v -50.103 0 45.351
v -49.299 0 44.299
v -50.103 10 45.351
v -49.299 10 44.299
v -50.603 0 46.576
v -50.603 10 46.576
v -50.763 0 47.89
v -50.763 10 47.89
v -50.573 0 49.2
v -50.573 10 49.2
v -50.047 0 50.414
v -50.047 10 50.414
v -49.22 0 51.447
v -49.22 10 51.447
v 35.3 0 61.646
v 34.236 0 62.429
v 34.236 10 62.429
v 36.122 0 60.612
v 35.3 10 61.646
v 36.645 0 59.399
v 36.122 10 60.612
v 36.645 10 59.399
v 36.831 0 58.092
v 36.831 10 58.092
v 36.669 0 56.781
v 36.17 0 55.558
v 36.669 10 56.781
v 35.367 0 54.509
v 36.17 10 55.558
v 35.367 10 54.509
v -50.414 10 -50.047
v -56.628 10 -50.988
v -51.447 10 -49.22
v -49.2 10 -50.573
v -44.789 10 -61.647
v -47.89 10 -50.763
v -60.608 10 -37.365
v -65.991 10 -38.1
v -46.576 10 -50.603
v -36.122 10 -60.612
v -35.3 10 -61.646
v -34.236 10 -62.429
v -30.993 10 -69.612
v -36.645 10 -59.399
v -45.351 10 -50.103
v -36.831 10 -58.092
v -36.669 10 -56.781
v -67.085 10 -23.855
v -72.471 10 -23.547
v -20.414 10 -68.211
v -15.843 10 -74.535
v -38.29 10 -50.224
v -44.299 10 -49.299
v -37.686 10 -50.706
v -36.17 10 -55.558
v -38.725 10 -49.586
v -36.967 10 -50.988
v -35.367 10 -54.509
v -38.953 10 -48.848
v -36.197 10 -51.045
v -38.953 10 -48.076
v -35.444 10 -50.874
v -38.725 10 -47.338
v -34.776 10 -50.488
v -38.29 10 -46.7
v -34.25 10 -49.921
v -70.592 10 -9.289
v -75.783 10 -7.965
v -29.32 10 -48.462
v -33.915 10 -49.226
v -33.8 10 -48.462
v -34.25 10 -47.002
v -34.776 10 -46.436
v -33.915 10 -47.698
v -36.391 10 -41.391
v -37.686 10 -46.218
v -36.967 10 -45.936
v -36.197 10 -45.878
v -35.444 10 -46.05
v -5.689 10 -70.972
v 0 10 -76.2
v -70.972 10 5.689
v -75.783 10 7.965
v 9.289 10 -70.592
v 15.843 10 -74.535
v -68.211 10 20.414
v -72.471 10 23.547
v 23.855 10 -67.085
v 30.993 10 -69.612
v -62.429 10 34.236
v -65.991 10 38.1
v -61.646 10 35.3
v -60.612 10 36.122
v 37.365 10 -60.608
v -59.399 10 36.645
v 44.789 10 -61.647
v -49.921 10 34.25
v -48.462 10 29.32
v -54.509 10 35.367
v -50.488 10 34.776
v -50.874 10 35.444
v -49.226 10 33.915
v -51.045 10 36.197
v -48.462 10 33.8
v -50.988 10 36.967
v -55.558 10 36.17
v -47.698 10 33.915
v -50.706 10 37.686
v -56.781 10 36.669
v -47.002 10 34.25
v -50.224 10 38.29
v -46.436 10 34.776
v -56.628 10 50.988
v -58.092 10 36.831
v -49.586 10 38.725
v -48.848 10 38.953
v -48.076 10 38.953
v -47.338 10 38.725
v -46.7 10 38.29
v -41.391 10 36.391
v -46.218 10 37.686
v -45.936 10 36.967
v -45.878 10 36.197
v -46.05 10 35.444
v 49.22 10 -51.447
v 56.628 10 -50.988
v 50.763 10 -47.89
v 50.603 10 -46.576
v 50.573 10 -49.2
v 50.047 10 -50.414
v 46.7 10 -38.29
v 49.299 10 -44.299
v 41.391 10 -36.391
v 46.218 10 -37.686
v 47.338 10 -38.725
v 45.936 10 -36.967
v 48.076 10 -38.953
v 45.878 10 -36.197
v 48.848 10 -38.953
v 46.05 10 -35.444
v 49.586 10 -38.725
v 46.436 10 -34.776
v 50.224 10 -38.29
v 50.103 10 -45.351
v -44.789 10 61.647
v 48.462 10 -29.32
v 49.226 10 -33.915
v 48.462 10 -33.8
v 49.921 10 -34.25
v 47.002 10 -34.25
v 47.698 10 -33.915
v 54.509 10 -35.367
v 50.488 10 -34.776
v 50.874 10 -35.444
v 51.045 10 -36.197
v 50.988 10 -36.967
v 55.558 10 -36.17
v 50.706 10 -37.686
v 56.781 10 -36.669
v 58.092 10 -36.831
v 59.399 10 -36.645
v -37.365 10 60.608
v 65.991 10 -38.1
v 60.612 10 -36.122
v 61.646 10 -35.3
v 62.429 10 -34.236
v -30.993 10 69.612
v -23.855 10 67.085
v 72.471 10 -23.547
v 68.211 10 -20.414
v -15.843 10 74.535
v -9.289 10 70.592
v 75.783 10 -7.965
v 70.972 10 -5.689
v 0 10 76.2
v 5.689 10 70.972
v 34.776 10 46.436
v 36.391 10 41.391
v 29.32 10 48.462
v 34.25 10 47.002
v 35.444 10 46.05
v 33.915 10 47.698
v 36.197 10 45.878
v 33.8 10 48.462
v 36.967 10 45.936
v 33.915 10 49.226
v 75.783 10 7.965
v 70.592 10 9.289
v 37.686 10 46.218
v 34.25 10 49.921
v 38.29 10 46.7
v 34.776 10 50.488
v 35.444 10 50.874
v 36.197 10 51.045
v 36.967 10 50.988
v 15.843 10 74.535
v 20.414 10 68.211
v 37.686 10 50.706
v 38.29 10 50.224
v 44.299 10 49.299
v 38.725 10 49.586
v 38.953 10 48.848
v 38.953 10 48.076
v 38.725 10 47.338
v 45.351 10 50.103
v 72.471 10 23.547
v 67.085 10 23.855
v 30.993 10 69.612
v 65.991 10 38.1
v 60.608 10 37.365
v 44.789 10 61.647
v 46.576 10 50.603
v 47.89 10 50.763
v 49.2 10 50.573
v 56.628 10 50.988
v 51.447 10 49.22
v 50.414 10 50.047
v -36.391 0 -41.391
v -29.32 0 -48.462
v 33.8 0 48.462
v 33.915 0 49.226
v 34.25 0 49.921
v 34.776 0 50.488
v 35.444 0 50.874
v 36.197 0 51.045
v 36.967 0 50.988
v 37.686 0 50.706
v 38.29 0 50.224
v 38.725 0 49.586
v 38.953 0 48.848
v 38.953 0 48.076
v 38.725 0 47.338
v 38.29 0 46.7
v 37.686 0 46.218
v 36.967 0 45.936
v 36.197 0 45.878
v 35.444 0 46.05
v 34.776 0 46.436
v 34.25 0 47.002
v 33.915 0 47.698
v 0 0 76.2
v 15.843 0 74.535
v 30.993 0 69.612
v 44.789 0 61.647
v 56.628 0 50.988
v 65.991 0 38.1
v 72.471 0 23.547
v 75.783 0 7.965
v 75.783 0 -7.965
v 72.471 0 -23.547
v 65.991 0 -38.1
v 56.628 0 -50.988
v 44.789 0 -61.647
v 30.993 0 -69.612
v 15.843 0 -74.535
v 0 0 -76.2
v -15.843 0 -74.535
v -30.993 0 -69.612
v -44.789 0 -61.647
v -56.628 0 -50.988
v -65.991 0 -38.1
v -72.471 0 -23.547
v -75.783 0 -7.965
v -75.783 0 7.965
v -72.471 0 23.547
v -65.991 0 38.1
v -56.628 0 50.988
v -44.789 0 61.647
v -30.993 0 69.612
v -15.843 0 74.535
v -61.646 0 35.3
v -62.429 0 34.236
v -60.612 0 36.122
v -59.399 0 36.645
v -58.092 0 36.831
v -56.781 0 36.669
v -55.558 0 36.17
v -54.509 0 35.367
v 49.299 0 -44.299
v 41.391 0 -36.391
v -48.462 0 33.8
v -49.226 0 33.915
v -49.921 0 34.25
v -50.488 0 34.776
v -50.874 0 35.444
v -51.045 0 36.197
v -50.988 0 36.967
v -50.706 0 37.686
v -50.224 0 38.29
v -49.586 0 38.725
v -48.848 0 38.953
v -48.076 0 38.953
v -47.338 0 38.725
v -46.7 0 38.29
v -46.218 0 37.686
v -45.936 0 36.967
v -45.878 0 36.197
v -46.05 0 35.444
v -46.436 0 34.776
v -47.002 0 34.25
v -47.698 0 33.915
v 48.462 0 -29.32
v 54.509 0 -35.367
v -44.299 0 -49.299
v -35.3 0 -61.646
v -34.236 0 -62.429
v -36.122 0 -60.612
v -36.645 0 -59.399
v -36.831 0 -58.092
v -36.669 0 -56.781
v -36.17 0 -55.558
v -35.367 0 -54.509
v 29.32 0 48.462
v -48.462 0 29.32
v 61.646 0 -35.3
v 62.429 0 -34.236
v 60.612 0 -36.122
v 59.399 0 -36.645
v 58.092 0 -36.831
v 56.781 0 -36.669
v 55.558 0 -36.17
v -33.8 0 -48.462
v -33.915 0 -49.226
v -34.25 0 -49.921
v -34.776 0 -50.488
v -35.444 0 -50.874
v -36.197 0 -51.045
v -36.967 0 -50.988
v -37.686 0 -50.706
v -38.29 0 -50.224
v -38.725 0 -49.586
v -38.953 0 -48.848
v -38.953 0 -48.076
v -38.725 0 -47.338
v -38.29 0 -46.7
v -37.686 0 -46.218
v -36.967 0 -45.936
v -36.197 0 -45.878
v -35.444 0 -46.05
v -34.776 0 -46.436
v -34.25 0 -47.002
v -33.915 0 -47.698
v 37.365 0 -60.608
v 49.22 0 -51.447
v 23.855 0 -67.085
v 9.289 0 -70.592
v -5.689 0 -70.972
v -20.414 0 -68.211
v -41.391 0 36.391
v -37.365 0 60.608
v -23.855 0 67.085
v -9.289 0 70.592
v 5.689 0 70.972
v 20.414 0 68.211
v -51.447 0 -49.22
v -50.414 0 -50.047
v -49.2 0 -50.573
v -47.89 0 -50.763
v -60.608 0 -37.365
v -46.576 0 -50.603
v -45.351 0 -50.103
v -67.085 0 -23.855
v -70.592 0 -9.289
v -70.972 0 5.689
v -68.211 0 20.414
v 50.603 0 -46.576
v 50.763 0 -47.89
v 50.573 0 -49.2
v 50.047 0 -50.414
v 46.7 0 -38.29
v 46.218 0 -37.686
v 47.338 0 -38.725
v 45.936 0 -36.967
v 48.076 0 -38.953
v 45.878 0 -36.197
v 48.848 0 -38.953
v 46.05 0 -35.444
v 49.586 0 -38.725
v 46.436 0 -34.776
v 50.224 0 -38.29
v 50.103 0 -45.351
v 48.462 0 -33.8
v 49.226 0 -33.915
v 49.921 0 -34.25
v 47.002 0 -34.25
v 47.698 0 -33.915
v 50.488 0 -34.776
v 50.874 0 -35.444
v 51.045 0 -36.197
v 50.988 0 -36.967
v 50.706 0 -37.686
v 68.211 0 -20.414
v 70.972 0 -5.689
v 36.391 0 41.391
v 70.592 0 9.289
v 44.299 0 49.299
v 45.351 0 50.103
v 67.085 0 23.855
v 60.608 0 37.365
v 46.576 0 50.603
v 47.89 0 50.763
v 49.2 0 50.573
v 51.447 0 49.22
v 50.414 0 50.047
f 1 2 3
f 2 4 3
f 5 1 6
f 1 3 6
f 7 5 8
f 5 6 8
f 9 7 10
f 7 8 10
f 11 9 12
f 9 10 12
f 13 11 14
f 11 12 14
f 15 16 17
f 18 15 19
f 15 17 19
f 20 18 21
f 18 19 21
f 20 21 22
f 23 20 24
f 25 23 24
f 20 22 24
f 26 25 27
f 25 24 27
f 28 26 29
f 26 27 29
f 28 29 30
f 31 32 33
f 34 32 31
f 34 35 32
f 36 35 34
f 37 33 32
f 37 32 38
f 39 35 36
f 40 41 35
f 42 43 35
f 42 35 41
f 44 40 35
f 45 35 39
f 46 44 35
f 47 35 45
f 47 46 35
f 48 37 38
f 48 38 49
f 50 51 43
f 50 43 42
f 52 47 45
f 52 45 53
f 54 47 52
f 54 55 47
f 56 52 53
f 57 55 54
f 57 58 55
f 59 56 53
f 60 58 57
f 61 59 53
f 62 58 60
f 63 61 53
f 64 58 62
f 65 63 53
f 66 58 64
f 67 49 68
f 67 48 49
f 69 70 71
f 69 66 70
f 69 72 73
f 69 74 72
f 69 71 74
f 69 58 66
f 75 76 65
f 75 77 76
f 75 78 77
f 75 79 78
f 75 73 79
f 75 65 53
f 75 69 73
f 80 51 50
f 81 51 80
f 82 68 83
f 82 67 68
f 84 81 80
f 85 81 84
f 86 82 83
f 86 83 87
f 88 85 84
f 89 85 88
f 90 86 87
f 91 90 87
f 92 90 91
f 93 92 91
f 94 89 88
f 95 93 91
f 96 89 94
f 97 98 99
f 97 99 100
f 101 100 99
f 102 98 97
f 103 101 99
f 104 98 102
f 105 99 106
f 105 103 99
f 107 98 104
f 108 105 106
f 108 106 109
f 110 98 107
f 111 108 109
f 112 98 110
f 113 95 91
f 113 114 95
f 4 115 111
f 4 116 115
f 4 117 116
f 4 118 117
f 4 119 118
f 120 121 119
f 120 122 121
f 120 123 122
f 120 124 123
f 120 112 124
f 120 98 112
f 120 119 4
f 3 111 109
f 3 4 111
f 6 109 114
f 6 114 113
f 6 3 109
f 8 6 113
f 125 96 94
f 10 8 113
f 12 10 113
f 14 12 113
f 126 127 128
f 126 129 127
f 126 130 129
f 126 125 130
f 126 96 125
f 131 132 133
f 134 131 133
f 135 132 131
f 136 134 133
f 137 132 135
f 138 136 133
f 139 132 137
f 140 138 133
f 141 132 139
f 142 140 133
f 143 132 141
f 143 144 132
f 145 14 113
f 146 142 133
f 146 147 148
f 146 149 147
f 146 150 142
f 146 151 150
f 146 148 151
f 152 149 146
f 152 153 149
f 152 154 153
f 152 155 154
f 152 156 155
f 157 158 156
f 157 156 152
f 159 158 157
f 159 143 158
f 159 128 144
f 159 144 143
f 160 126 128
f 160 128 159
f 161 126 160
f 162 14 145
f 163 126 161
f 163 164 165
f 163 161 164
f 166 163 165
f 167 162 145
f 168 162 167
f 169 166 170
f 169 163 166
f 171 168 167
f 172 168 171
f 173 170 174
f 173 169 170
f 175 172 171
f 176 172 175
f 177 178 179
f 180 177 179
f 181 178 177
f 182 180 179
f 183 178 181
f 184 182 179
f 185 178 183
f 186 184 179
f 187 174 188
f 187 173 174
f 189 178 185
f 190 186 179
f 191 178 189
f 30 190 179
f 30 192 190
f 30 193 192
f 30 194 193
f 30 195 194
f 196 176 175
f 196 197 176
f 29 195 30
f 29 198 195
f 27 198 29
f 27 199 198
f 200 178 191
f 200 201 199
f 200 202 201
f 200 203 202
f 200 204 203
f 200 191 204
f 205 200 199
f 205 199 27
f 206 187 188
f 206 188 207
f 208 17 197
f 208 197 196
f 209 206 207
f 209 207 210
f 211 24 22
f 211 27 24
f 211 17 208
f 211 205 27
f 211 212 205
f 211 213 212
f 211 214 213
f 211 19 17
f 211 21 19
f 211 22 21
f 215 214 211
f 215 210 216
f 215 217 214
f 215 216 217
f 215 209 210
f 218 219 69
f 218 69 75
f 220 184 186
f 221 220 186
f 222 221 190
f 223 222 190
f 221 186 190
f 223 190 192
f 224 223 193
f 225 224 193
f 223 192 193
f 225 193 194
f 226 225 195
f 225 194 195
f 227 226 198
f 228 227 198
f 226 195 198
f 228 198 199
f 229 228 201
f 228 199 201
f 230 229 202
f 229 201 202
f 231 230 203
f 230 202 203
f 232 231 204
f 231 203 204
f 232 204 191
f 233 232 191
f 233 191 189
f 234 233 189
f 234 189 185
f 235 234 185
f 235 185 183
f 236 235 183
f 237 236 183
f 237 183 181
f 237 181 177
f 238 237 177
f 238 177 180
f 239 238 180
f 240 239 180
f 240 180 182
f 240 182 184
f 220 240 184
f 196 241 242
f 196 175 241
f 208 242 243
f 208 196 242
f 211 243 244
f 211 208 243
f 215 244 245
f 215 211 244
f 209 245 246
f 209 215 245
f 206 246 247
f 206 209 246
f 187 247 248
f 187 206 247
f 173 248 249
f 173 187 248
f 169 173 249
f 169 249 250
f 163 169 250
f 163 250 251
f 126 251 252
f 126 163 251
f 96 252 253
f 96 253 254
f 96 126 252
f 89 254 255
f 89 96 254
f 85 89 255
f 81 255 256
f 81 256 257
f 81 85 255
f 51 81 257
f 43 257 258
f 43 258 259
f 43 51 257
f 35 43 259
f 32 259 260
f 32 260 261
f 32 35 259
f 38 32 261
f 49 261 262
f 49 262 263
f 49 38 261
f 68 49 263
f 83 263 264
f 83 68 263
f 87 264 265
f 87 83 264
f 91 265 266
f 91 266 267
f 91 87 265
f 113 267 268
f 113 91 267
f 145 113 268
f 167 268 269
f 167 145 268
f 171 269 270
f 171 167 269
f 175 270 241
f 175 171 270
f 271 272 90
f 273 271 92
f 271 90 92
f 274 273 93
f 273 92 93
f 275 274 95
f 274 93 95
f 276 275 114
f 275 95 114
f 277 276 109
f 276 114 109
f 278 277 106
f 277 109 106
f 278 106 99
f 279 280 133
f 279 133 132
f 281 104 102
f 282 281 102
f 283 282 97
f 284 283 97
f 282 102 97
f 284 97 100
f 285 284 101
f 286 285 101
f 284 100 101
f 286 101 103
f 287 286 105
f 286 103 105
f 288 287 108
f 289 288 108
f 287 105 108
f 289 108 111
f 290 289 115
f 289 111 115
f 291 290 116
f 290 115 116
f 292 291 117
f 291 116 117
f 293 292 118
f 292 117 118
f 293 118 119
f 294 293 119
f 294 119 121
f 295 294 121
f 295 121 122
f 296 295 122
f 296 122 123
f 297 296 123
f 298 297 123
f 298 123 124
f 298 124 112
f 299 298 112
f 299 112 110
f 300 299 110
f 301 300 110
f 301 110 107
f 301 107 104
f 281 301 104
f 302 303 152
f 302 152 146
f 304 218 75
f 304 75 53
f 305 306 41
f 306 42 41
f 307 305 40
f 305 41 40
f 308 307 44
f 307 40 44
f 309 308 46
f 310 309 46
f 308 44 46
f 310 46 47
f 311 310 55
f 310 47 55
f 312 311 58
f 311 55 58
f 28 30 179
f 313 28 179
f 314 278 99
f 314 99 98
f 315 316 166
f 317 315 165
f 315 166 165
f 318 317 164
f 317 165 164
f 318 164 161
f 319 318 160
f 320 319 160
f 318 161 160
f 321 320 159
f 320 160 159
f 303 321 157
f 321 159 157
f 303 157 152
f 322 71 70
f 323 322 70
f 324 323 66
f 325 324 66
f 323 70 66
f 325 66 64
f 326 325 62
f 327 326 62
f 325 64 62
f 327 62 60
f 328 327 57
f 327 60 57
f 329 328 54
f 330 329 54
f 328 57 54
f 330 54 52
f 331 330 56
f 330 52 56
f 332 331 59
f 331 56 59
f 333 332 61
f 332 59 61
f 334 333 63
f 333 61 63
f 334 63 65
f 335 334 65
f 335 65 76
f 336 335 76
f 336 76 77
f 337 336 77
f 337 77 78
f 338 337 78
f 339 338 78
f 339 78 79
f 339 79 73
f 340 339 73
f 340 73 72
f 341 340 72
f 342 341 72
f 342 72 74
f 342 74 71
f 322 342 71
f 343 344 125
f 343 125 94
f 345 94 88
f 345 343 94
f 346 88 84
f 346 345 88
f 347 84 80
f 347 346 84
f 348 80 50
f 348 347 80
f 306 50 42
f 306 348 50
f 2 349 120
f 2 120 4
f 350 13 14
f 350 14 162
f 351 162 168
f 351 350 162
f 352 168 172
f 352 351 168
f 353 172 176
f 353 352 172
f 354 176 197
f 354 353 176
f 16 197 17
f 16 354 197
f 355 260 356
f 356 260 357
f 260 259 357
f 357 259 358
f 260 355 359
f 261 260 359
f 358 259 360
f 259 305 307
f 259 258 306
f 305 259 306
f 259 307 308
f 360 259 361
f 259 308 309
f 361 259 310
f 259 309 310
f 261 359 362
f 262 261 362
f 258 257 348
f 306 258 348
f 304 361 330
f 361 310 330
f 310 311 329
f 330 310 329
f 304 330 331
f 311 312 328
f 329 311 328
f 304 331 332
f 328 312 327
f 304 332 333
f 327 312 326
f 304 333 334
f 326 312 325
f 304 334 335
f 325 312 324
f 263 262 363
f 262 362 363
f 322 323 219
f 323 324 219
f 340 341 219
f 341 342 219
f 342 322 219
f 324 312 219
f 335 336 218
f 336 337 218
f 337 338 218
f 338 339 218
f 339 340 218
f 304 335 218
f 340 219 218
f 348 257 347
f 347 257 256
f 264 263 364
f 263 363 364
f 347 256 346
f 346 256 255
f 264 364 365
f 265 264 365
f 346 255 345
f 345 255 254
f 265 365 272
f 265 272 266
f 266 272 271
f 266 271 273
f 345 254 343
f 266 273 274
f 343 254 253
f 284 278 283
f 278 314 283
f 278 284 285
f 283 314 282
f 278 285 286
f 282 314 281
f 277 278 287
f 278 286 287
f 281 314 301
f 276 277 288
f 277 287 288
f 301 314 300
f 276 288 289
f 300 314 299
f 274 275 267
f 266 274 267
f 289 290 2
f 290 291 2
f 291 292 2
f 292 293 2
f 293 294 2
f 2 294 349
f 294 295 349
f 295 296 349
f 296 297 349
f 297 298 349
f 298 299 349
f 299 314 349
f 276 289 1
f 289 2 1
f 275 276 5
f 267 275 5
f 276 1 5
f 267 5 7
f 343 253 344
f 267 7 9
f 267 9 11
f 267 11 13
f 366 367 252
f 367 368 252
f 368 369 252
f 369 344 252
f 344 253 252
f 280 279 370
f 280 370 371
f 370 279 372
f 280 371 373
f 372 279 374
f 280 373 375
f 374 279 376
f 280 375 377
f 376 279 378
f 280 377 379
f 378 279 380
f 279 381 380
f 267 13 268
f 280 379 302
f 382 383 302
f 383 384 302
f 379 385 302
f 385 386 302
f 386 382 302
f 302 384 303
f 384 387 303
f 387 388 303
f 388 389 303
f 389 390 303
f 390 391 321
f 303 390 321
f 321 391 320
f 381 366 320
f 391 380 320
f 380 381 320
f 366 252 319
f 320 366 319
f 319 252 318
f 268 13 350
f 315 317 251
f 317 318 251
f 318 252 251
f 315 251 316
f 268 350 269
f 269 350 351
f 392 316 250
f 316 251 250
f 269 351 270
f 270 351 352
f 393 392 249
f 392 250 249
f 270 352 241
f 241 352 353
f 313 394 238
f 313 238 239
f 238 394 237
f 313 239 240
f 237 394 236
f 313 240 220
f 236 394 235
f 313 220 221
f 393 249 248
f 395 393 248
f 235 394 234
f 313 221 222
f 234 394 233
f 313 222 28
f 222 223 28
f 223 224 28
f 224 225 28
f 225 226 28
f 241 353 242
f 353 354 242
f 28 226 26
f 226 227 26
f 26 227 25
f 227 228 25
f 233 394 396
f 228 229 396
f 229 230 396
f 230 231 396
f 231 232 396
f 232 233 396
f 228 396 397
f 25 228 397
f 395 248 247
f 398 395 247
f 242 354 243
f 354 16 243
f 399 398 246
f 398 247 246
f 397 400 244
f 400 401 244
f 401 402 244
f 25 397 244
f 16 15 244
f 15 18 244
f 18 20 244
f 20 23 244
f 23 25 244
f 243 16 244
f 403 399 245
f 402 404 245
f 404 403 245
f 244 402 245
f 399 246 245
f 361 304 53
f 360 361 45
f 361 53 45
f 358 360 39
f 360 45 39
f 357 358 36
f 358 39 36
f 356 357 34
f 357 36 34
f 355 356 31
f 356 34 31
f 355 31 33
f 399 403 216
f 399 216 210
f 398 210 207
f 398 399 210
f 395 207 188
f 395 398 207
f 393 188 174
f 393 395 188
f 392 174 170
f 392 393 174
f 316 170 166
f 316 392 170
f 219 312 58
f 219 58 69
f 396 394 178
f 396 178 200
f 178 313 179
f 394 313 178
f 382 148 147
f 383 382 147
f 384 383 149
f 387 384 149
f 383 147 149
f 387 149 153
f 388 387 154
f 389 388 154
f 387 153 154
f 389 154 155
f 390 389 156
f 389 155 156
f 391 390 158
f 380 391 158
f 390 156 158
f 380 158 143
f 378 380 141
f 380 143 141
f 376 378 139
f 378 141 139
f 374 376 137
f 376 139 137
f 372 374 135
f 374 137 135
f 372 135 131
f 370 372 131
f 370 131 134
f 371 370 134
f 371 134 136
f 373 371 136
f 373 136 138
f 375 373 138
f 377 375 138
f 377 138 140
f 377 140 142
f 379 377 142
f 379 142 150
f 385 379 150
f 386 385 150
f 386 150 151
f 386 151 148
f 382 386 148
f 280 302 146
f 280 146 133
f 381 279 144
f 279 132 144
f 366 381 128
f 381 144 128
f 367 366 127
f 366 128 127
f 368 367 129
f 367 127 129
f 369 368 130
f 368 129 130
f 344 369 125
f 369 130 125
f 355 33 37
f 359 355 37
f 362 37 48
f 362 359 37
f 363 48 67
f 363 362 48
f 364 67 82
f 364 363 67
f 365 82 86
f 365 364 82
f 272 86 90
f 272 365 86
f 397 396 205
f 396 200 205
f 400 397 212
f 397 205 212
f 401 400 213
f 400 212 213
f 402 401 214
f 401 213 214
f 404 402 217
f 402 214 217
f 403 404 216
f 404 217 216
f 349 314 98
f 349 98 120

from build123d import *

# Parameters (mm, degrees)
SKETCH2_W                  = 21.2
SKETCH2_H                  = 10
F_6_0_204_DIAMETER_HOLE1_D = 5.1816
CUT_EXTRUDE1_DEPTH         = 11
CIRPATTERN1_COUNT          = 4
FILLET1_R                  = 5


with BuildPart() as part:
    # Sketch2 → Revolve1 (revolve)
    with BuildSketch(Plane(origin=(0, 0, 0), x_dir=(0, 0, -1), z_dir=(1, 0, 0))):
        with Locations((-65.6, 5)):
            Rectangle(SKETCH2_W, SKETCH2_H)
    revolve(axis=Axis((0, 3.678923398, 0), (0, 1, 0)))

    # #6 (0.204) Diameter Hole1 (through all)
    with Locations(Plane(origin=(0, 0, 0), x_dir=(-1, 0, 0), z_dir=(0, -1, 0))):
        with Locations((36.390872965, 48.461940777)):
            f_6_0_204_diameter_hole1 = Hole(F_6_0_204_DIAMETER_HOLE1_D / 2)

    # Sketch14 → Cut-Extrude1 (cut, through all)
    with BuildSketch(Plane.XZ):
        with BuildLine():
            Line((-33.070789849, -38.070789849), (-47.783894042, -52.783894042))
            ThreePointArc((-47.783894042, -52.783894042), (-70.683932228, -8.55696937), (-58.998941132, 39.856805508))
            Line((-58.998941132, 39.856805508), (-55.533008589, 36.390872965))
            Line((-55.533008589, 36.390872965), (-48.461940777, 29.319805153))
            Line((-48.461940777, 29.319805153), (-41.390872965, 36.390872965))
            Line((-41.390872965, 36.390872965), (-38.070789849, 33.070789849))
            ThreePointArc((-38.070789849, 33.070789849), (-50.304693428, -3.535533906), (-33.070789849, -38.070789849))
        make_face()
    cut_extrude1 = extrude(amount=-CUT_EXTRUDE1_DEPTH, mode=Mode.SUBTRACT)

    # CirPattern1: #6 (0.204) Diameter Hole1, Cut-Extrude1 ×4 about axis
    cirpattern1_axis = Axis((0, 0, 0), (0, 1, 0))
    for i in range(1, CIRPATTERN1_COUNT):
        add(f_6_0_204_diameter_hole1.rotate(cirpattern1_axis, i * 360 / CIRPATTERN1_COUNT), mode=Mode.SUBTRACT)
        add(cut_extrude1.rotate(cirpattern1_axis, i * 360 / CIRPATTERN1_COUNT), mode=Mode.SUBTRACT)

    # Fillet1
    fillet1_edges = [part.edges().sort_by_distance(p)[0] for p in [
        (-47.783894042, 5, -52.783894042),
        (-58.998941132, 5, 39.856805508),
        (-52.783894042, 5, 47.783894042),
        (39.856805508, 5, 58.998941132),
        (47.783894042, 5, 52.783894042),
        (58.998941132, 5, -39.856805508),
        (52.783894042, 5, -47.783894042),
        (-39.856805508, 5, -58.998941132),
    ]]
    fillet(fillet1_edges, radius=FILLET1_R)


solid = part.part
